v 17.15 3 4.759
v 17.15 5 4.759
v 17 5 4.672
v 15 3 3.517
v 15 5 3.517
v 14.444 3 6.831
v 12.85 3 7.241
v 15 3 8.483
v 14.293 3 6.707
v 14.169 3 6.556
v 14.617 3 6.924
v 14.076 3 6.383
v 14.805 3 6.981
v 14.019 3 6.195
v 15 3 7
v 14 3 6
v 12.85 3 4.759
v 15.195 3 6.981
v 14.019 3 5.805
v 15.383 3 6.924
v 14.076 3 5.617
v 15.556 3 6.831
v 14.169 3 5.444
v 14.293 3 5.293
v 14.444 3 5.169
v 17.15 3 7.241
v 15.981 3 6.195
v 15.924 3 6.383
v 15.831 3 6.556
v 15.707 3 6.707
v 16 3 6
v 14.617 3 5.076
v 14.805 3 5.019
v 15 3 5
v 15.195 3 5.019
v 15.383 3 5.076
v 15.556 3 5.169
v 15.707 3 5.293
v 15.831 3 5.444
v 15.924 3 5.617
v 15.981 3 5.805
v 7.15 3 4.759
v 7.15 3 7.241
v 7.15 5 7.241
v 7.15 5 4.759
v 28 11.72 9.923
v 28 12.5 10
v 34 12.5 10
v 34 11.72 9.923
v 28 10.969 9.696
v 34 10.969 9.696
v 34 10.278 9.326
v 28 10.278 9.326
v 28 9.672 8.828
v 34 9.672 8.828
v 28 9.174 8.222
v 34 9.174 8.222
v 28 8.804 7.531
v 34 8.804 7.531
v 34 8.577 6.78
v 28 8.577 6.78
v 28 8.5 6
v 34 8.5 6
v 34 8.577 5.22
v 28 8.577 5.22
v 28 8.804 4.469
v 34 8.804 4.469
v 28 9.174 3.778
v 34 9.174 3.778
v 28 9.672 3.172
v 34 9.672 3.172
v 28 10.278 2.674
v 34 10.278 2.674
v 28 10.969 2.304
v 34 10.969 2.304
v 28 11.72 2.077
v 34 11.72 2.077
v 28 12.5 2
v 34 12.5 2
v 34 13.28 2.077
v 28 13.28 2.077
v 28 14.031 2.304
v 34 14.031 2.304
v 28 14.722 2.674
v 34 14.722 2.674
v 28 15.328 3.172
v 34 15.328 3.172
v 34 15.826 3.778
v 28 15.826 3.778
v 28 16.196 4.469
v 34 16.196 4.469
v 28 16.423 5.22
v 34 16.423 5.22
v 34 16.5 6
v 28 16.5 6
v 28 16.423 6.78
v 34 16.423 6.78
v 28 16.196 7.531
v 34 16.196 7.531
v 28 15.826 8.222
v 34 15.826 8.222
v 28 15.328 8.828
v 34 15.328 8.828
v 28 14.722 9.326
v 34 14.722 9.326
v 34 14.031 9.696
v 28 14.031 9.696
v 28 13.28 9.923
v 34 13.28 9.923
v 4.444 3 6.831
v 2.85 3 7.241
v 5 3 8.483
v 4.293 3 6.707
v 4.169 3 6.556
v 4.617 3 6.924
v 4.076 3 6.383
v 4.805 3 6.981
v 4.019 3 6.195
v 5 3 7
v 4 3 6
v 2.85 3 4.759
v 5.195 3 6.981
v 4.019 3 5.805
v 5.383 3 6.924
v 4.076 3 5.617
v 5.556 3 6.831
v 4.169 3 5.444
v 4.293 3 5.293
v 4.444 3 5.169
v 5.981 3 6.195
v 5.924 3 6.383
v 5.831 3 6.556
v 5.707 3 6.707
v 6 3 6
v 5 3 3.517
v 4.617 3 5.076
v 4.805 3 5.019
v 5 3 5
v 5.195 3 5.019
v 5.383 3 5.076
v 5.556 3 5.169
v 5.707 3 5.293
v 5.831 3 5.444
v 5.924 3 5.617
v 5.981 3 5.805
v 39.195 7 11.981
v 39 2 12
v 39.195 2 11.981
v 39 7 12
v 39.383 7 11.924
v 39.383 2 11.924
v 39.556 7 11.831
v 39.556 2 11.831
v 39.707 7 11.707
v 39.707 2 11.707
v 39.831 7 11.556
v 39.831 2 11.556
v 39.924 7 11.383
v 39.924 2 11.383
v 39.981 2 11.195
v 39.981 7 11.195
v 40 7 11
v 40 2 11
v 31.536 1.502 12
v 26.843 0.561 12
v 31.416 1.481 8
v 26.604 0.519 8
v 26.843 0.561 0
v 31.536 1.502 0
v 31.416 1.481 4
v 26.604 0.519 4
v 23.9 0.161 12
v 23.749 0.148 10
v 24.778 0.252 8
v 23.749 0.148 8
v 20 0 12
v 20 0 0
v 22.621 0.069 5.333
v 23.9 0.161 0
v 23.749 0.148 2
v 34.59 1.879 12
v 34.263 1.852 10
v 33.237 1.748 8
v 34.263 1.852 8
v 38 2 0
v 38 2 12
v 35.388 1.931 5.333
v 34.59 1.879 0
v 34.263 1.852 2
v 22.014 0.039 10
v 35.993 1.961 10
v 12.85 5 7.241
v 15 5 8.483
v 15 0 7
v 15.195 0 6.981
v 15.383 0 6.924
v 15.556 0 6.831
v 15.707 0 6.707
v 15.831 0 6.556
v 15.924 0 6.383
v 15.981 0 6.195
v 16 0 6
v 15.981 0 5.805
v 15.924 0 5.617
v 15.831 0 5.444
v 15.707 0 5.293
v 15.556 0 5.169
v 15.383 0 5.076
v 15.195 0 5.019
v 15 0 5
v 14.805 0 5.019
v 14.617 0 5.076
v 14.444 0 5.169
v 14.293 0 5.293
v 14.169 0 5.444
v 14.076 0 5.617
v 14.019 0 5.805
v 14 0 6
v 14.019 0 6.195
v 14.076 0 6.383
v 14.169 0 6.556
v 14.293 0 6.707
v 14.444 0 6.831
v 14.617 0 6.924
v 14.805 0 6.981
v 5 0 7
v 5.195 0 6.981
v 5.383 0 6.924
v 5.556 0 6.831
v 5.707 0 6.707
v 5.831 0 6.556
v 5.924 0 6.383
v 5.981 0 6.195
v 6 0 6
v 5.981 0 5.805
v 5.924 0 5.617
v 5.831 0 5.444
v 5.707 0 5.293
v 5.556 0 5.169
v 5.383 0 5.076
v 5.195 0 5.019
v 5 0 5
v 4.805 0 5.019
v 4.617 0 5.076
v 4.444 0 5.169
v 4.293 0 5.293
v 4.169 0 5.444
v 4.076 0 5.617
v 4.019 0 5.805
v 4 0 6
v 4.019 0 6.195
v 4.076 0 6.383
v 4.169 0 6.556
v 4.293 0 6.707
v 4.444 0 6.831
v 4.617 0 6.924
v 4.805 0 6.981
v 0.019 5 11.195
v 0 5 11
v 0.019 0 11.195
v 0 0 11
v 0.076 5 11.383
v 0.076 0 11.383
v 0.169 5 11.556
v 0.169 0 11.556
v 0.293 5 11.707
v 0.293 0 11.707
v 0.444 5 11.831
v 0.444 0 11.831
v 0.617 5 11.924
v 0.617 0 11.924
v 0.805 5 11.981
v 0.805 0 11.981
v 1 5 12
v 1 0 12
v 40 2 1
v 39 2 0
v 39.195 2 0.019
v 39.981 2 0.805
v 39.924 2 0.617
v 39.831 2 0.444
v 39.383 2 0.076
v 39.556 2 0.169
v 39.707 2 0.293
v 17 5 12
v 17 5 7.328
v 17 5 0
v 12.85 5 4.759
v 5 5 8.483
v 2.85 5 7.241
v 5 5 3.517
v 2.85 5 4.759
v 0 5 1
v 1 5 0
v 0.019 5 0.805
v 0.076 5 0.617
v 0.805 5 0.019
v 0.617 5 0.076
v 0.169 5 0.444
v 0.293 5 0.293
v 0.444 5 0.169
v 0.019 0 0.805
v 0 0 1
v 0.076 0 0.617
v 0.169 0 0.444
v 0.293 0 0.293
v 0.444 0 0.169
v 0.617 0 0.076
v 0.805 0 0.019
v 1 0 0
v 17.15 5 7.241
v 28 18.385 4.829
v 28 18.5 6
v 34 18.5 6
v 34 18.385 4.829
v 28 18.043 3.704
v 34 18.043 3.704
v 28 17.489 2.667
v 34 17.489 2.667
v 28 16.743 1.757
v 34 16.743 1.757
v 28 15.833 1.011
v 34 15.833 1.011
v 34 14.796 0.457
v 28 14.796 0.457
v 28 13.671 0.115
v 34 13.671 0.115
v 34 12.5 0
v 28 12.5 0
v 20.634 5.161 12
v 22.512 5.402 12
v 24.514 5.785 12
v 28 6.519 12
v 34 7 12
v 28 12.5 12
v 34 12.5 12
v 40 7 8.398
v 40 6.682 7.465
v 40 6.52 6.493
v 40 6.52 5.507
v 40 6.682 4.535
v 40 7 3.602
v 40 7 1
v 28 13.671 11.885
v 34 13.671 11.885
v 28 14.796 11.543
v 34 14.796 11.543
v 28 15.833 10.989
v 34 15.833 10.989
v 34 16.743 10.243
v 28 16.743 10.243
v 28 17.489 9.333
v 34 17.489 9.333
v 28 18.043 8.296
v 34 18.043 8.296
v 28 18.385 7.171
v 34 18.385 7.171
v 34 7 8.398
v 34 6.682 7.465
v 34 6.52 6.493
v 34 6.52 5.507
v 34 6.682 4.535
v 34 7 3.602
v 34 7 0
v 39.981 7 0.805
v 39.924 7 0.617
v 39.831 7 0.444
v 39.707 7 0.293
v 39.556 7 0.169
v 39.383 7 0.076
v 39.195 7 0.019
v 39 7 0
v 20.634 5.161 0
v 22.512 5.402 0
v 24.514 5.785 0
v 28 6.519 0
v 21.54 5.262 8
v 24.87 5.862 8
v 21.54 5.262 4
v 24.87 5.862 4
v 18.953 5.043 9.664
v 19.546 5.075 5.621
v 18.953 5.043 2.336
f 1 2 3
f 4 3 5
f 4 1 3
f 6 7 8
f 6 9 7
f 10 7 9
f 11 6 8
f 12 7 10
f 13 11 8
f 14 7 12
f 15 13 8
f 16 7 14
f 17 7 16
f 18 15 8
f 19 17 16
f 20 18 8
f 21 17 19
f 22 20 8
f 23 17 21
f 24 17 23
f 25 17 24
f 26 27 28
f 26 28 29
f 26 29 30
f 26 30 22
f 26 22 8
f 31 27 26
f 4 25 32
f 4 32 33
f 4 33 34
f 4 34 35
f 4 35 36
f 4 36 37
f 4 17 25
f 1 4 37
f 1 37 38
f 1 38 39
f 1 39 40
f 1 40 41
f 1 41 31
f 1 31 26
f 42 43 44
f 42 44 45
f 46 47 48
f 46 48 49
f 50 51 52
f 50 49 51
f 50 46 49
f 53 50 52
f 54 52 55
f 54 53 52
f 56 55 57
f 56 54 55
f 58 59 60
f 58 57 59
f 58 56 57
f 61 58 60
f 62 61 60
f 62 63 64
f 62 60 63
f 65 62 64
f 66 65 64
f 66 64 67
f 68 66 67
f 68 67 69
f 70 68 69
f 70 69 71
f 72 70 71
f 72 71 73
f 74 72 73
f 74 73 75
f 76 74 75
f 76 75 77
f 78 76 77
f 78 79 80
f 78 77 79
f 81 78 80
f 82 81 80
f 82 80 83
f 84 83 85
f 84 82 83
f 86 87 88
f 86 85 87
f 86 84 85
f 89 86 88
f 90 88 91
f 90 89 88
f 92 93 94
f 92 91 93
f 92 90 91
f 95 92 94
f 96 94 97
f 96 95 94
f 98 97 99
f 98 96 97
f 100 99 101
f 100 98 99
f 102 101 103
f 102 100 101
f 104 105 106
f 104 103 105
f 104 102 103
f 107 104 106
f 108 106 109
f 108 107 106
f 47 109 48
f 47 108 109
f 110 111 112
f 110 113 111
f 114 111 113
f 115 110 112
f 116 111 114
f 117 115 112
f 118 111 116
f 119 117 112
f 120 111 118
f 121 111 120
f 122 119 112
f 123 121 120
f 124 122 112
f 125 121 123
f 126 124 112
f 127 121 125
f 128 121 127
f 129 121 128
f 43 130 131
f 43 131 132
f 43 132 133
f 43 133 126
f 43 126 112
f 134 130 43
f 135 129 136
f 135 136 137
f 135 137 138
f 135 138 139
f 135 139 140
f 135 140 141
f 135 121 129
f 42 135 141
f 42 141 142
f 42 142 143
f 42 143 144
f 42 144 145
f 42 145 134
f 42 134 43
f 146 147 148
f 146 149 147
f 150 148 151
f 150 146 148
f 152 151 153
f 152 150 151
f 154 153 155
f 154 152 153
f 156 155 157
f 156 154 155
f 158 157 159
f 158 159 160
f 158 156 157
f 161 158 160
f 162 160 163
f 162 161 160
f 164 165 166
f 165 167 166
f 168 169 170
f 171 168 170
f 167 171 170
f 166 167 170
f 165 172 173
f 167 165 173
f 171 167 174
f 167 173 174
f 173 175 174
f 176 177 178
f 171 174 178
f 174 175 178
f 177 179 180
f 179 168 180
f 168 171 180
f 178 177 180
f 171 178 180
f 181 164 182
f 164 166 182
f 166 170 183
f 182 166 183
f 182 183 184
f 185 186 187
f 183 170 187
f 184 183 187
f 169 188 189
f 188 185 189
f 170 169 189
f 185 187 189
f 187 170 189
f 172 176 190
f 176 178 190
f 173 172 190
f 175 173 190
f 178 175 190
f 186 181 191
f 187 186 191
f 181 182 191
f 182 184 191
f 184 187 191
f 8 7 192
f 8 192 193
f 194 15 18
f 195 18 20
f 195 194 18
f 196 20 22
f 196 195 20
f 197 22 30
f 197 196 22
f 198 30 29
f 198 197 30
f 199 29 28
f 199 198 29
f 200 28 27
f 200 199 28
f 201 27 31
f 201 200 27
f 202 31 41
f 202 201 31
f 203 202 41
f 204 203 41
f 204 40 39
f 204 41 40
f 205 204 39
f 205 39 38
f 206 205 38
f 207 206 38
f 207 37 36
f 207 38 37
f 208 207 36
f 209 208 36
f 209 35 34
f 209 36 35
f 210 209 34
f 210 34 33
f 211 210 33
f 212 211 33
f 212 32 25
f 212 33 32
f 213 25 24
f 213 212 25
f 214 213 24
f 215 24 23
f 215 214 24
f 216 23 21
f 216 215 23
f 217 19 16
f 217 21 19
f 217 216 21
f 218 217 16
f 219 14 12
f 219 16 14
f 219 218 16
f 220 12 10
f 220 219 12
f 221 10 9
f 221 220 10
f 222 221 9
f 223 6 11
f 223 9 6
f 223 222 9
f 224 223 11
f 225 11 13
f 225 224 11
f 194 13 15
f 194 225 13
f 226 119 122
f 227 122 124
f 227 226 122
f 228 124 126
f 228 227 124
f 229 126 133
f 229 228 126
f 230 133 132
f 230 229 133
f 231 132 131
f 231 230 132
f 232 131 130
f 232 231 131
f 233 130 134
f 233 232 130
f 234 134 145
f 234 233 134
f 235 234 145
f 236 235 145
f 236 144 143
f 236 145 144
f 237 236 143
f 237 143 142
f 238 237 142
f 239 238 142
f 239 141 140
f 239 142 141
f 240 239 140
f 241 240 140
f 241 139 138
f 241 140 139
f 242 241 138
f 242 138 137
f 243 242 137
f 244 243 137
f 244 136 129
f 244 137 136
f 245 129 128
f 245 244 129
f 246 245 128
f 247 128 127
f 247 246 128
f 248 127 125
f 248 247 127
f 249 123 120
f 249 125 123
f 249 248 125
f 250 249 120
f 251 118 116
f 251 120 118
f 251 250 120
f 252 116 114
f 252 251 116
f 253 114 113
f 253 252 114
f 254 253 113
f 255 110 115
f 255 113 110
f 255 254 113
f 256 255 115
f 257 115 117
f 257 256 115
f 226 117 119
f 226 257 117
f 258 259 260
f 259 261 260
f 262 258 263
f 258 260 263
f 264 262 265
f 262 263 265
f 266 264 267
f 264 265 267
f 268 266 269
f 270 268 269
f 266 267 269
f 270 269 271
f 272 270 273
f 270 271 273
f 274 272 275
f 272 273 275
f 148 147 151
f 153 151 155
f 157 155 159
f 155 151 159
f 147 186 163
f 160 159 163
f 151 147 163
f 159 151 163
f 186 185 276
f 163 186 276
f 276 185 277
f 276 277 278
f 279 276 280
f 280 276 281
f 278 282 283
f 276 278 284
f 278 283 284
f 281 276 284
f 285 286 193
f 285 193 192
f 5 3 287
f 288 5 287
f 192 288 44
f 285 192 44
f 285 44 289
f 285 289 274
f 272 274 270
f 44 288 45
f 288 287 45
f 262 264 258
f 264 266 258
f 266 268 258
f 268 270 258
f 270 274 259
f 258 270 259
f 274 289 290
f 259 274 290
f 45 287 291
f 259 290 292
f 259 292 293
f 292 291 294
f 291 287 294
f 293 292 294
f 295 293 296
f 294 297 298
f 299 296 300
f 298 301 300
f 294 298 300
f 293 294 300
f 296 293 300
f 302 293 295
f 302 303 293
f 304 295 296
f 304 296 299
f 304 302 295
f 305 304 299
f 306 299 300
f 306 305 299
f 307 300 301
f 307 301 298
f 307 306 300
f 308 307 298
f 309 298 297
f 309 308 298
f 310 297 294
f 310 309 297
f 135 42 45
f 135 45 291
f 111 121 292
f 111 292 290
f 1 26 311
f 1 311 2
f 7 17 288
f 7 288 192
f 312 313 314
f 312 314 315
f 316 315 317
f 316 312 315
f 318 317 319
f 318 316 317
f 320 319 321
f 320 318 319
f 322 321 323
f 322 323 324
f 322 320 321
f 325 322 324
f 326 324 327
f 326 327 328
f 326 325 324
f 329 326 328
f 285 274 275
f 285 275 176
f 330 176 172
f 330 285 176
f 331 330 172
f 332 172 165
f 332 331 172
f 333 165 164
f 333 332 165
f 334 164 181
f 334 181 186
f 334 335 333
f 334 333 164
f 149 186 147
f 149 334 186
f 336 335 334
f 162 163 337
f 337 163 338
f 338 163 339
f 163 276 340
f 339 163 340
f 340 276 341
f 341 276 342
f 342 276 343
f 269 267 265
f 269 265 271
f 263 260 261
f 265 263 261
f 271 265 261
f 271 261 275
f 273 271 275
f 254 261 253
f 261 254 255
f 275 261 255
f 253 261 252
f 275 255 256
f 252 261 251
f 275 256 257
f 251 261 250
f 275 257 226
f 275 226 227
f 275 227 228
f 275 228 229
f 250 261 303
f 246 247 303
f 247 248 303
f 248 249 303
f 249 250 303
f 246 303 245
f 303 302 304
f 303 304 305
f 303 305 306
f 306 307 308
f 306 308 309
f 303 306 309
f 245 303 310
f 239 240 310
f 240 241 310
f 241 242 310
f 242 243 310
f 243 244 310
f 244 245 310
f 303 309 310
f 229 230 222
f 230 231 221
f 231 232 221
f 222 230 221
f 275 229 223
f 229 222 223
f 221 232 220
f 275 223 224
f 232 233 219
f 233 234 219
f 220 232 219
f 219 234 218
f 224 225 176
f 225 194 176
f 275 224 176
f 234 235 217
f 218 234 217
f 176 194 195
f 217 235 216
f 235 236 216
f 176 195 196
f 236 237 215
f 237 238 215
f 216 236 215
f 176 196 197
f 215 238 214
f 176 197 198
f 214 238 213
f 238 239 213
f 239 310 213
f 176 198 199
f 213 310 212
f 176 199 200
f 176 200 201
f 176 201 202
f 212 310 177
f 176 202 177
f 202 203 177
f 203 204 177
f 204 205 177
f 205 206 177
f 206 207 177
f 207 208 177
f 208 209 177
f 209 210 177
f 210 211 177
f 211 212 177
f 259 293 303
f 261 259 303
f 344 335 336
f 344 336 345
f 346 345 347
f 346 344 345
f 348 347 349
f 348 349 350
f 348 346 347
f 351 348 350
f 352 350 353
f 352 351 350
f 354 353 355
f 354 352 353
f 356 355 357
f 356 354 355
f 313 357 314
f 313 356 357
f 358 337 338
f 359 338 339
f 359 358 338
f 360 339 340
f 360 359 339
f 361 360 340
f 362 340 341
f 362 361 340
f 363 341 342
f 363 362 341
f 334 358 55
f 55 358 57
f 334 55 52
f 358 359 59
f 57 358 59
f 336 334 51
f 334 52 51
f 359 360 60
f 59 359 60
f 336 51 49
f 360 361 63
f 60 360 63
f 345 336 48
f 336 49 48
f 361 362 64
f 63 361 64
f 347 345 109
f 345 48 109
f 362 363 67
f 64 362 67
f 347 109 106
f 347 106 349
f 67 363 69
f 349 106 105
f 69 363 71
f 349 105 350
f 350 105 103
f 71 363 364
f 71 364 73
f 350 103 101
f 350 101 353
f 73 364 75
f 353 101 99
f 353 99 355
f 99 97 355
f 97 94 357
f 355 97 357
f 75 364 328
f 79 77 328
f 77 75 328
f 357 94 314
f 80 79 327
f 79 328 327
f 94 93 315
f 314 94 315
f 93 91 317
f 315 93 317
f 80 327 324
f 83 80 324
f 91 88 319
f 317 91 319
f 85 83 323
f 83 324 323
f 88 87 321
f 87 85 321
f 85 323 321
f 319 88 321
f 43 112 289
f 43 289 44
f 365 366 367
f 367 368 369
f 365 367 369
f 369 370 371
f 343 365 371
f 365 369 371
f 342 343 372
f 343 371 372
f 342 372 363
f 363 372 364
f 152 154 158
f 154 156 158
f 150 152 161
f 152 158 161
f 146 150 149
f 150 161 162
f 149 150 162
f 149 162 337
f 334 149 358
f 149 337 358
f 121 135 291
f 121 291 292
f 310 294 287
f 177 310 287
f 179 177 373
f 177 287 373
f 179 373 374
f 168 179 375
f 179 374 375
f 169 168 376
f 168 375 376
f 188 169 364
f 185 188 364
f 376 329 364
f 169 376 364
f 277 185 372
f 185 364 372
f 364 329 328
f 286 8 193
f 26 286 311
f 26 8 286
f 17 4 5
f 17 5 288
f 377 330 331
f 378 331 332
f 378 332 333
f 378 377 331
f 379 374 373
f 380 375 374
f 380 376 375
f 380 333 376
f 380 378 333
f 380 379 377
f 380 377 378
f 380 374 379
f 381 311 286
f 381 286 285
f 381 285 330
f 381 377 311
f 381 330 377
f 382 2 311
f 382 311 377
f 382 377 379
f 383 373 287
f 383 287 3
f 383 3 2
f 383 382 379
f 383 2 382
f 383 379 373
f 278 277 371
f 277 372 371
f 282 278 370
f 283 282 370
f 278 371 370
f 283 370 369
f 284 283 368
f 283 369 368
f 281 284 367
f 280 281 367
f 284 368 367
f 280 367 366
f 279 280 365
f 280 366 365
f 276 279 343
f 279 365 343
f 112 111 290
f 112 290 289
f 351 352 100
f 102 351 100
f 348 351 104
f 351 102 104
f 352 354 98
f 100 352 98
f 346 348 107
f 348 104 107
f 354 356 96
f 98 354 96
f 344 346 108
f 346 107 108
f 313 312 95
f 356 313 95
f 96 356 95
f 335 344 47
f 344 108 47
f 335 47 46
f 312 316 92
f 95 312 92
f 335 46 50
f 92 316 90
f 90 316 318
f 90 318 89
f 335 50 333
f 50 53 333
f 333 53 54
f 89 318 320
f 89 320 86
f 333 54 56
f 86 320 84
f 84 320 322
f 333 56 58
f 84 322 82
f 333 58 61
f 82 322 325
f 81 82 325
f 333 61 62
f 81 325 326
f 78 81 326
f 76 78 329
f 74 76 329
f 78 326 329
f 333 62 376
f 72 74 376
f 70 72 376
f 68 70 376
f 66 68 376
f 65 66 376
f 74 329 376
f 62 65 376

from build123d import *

# Parameters (mm, degrees)
BOSS_EXTRUDE1_DEPTH     = 12
SKETCH2_R               = 4
CUT_EXTRUDE1_DEPTH      = 46.675485921
SKETCH3_R               = 1
CUT_EXTRUDE2_DEPTH      = 46.67548588
FILLET2_R               = 1
SKETCH5_R               = 6
CUT_EXTRUDE3_DEPTH      = 10
CUT_EXTRUDE4_DEPTH      = 1
CUT_EXTRUDE4_DEPTH_BACK = 2


with BuildPart() as part:
    # Sketch1 → Boss-Extrude1 (new body)
    with BuildSketch(Plane.XY):
        with BuildLine():
            Line((0, 5), (0, 0))
            Line((0, 0), (20, 0))
            add(Edge.make_bspline(
                [(20, 0), (28.689683173, 0), (29.340198242, 2), (38, 2)],
                knots=[0, 0, 0, 0, 1, 1, 1, 1], degree=3))
            Line((38, 2), (40, 2))
            Line((40, 2), (40, 7))
            Line((40, 7), (34, 7))
            Line((34, 7), (34, 18.5))
            Line((34, 18.5), (28, 18.5))
            Line((28, 18.5), (28, 6.519175256))
            add(Edge.make_bspline(
                [(17, 5), (22.481298088, 5), (24.633063977, 5.927411475), (28, 6.519175256)],
                knots=[0, 0, 0, 0, 0.680959424, 0.680959424, 0.680959424, 0.680959424], degree=3))
            Line((17, 5), (0, 5))
        make_face()
    extrude(amount=BOSS_EXTRUDE1_DEPTH)

    # Sketch2 → Cut-Extrude1 (cut, through all)
    with BuildSketch(Plane(origin=(0, 0, 0), x_dir=(0, 0, -1), z_dir=(1, 0, 0))):
        with BuildLine():
            Line((0, 12.5), (0, 18.5))
            Line((0, 18.5), (-6, 18.5))
            ThreePointArc((-6, 18.5), (-1.757359313, 16.742640687), (0, 12.5))
        make_face()
        with BuildLine():
            ThreePointArc((-12, 12.5), (-10.242640687, 16.742640687), (-6, 18.5))
            Line((-6, 18.5), (-12, 18.5))
            Line((-12, 18.5), (-12, 12.5))
        make_face()
        with Locations(Location((-6, 12.5, 0), (0, 0, 180))):
            Circle(SKETCH2_R)
    extrude(amount=CUT_EXTRUDE1_DEPTH, mode=Mode.SUBTRACT)

    # Sketch3 → Cut-Extrude2 (cut, through all)
    with BuildSketch(Plane(origin=(0, 0, 0), x_dir=(1, 0, 0), z_dir=(0, 1, 0))):
        with Locations(Location((15, -6, 0), (0, 0, 270))):
            Circle(SKETCH3_R)
        with Locations(Location((5, -6, 0), (0, 0, 270))):
            Circle(SKETCH3_R)
    extrude(amount=CUT_EXTRUDE2_DEPTH, mode=Mode.SUBTRACT)

    # Fillet2
    fillet2_edges = [part.edges().sort_by_distance(p)[0] for p in [
        (0, 2.5, 12),
        (40, 4.5, 0),
        (0, 2.5, 0),
        (40, 4.5, 12),
    ]]
    fillet(fillet2_edges, radius=FILLET2_R)

    # Sketch5 → Cut-Extrude3 (cut)
    with BuildSketch(Plane(origin=(34, 0, 0), x_dir=(0, 0, -1), z_dir=(1, 0, 0))):
        with Locations((-6, 12.5)):
            Circle(SKETCH5_R)
    extrude(amount=CUT_EXTRUDE3_DEPTH, mode=Mode.SUBTRACT)

    # Sketch6 → Cut-Extrude4 (cut, two sides: drawn at the far end of the back side and taken through both)
    with BuildSketch(Plane(origin=(0, 5, 0), x_dir=(1, 0, 0), z_dir=(0, 1, 0)).offset(-CUT_EXTRUDE4_DEPTH_BACK)):
        Polygon((12.85, -4.758696921), (12.85, -7.241303079), (15, -8.482606158), (17.15, -7.241303079), (17.15, -4.758696921), (15, -3.517393842), align=None)
        Polygon((5, -3.517393842), (2.85, -4.758696921), (2.85, -7.241303079), (5, -8.482606158), (7.15, -7.241303079), (7.15, -4.758696921), align=None)
    extrude(amount=CUT_EXTRUDE4_DEPTH + CUT_EXTRUDE4_DEPTH_BACK, mode=Mode.SUBTRACT)


solid = part.part
